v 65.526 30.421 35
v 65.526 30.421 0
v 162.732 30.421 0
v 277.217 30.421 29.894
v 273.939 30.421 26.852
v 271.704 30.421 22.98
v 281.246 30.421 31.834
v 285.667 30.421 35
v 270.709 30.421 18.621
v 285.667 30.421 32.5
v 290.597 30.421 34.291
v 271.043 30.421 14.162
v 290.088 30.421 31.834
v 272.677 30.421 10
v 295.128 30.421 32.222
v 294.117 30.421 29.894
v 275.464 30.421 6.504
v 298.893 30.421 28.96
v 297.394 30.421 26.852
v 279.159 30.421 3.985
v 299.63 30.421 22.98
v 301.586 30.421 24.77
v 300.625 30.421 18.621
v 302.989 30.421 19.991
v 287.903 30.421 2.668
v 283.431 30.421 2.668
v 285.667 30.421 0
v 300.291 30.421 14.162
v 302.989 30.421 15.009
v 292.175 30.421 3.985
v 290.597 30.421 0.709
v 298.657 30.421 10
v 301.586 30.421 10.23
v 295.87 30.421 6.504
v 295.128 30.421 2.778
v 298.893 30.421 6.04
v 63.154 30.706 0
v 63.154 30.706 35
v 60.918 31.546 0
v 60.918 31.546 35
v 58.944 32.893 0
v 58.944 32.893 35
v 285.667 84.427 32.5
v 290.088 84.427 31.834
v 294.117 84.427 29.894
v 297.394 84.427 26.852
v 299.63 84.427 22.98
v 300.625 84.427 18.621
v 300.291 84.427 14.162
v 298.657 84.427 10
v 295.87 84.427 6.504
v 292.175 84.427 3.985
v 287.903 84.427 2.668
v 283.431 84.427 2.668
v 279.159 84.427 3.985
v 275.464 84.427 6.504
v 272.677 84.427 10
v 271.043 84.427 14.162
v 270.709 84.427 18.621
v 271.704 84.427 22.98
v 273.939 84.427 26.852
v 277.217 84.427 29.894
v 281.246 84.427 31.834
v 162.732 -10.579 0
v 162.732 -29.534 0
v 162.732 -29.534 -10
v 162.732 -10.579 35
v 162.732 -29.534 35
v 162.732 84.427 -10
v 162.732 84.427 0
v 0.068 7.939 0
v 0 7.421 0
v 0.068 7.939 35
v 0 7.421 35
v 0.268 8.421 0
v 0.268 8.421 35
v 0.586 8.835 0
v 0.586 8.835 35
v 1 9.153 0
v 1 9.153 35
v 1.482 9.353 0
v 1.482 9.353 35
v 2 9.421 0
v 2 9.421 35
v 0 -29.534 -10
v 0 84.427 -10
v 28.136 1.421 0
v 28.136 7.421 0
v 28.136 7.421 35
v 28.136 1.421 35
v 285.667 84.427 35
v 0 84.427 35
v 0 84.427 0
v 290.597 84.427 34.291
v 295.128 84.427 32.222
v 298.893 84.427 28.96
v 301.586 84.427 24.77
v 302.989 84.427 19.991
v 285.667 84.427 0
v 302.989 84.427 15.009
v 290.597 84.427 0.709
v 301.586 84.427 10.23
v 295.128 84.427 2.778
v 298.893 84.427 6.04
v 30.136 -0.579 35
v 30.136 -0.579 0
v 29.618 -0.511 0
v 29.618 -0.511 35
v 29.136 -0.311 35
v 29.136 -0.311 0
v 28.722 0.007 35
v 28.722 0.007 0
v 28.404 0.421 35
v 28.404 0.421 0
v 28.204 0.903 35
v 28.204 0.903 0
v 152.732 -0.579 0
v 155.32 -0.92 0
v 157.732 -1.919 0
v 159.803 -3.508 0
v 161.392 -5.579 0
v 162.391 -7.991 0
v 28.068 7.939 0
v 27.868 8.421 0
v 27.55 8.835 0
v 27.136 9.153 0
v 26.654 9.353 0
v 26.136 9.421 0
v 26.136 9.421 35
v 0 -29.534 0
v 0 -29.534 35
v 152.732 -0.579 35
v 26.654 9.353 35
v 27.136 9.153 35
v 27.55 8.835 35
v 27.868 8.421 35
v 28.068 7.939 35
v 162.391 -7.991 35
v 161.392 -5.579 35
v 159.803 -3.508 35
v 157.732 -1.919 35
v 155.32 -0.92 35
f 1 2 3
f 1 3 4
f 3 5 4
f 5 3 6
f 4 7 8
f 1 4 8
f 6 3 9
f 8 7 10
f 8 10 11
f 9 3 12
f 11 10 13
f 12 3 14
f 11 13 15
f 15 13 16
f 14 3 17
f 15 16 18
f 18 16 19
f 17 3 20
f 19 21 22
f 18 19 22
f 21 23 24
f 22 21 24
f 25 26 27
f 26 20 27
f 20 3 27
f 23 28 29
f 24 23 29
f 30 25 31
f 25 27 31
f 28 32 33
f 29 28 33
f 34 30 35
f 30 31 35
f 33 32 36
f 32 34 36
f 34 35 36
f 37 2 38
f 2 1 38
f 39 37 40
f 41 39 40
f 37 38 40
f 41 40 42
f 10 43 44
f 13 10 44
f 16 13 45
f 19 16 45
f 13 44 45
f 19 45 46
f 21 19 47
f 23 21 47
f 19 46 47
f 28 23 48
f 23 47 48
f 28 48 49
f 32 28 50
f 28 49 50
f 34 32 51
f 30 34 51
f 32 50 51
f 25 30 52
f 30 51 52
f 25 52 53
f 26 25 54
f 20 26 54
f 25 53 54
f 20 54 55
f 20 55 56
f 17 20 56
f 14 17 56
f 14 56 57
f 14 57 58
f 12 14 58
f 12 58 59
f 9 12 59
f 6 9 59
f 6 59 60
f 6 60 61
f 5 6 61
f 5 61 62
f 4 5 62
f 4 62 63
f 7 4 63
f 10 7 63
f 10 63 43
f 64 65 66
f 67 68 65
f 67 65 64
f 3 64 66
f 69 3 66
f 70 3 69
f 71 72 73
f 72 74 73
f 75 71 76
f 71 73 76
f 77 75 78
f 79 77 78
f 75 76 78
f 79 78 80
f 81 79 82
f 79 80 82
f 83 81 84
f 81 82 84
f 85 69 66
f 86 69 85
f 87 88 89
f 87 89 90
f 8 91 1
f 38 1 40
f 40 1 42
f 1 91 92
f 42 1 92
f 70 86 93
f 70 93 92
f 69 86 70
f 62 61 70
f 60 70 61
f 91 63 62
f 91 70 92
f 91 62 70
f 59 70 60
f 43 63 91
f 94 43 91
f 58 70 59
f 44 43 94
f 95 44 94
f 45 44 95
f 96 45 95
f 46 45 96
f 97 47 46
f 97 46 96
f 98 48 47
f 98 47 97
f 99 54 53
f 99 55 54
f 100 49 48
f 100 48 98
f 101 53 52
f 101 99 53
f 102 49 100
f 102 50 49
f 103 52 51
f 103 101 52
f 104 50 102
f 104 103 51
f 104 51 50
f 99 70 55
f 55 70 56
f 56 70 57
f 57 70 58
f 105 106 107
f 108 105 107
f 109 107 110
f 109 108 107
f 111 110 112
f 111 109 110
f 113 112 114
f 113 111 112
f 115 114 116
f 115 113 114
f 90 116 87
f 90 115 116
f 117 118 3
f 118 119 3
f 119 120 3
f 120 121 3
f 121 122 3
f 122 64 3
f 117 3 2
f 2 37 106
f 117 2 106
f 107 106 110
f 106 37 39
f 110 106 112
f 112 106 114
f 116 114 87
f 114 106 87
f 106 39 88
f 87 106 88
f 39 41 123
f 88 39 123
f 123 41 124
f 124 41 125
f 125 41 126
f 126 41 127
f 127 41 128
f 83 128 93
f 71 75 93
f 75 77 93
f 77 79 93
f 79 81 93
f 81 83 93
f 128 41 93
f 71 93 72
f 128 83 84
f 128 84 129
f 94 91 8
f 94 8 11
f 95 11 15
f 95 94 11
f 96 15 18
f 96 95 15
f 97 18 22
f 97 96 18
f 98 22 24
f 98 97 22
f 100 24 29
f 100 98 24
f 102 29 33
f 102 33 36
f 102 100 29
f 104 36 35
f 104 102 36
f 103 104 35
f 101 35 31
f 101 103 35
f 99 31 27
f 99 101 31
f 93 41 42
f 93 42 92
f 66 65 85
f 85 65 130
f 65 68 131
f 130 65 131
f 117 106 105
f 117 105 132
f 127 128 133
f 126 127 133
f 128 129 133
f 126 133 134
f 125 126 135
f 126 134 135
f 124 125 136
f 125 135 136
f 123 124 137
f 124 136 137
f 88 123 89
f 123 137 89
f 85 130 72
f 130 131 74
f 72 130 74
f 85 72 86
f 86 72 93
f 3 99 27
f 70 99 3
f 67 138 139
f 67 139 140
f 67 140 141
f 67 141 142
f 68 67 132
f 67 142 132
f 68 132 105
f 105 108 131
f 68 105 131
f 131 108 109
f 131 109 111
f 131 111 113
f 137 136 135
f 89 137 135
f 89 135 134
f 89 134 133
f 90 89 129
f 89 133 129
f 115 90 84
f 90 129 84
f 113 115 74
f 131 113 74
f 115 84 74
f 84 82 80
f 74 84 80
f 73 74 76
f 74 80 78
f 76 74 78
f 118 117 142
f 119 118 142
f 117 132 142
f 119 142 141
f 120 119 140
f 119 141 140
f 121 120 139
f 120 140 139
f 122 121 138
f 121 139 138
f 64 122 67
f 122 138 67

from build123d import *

# Parameters (mm, degrees)
BOSS_EXTRUDE1_DEPTH   = 35
BOSS_EXTRUDE1_2_DEPTH = 35
SKETCH2_W             = 162.732130767
SKETCH2_H             = 113.961013526
BOSS_EXTRUDE2_DEPTH   = 10
SKETCH3_R             = 17.5
BOSS_EXTRUDE3_DEPTH   = 54.006142336
CUT_EXTRUDE2_REACH    = 327.764
SKETCH4_R             = 15
FILLET1_R             = 2
FILLET2_R             = 10


with BuildPart() as part:
    # Sketch1 → Boss-Extrude1 (new body)
    with BuildSketch(Plane.XY):
        Polygon((285.66695455, 30.421117945), (61.771160065, 30.421117945), (0, 84.427260281), (285.66695455, 84.427260281), align=None)
    extrude(amount=BOSS_EXTRUDE1_DEPTH)



with BuildPart() as body_2:
    # Sketch1 → Boss-Extrude1 2 (new body)
    with BuildSketch(Plane.XY):
        Polygon((28.135943206, -0.578882055), (162.732130767, -0.578882055), (162.732130767, -29.533753245), (0, -29.533753245), (0, 0), (0, 9.421117945), (28.135943206, 9.421117945), align=None)
    extrude(amount=BOSS_EXTRUDE1_2_DEPTH)


with BuildPart() as part_1:
    add(part.part)

    add(body_2.part)  # Boss-Extrude2 merges body 2
    # Sketch2 → Boss-Extrude2 (add)
    with BuildSketch(Plane(origin=(0, 0, 0), x_dir=(-1, 0, 0), z_dir=(0, 0, -1))):
        with Locations((-81.366065384, 27.446753518)):
            Rectangle(SKETCH2_W, SKETCH2_H)
    extrude(amount=BOSS_EXTRUDE2_DEPTH)

    # Sketch3 → Boss-Extrude3 (add)
    with BuildSketch(Plane(origin=(0, 84.427260281, 0), x_dir=(1, 0, 0), z_dir=(0, 1, 0))):
        with Locations((285.66695455, -17.5)):
            Circle(SKETCH3_R)
    extrude(amount=-BOSS_EXTRUDE3_DEPTH)

    # Sketch4 → Cut-Extrude2 (cut, up to next)
    with BuildSketch(Plane(origin=(0, 84.427260281, 0), x_dir=(1, 0, 0), z_dir=(0, 1, 0)), mode=Mode.PRIVATE) as cut_extrude2_sk1:
        with Locations(Location((285.66695455, -17.5, 0), (0, 0, 270))):
            Circle(SKETCH4_R)
    cut_extrude2_tool1 = extrude(cut_extrude2_sk1.sketch, amount=-CUT_EXTRUDE2_REACH, mode=Mode.PRIVATE) & part_1.part
    add(cut_extrude2_tool1.solids().sort_by_distance((285.666955, 84.42726, 17.5))[0], mode=Mode.SUBTRACT)

    # Fillet1
    fillet1_edges = [part_1.edges().sort_by_distance(p)[0] for p in [
        (0, 9.421117945, 17.5),
        (28.135943206, 9.421117945, 17.5),
        (28.135943206, -0.578882055, 17.5),
    ]]
    fillet(fillet1_edges, radius=FILLET1_R)

    # Fillet2
    fillet2_edges = [part_1.edges().sort_by_distance(p)[0] for p in [
        (162.732130767, -0.578882055, 17.5),
        (61.771160065, 30.421117945, 17.5),
    ]]
    fillet(fillet2_edges, radius=FILLET2_R)


solid = part_1.part
